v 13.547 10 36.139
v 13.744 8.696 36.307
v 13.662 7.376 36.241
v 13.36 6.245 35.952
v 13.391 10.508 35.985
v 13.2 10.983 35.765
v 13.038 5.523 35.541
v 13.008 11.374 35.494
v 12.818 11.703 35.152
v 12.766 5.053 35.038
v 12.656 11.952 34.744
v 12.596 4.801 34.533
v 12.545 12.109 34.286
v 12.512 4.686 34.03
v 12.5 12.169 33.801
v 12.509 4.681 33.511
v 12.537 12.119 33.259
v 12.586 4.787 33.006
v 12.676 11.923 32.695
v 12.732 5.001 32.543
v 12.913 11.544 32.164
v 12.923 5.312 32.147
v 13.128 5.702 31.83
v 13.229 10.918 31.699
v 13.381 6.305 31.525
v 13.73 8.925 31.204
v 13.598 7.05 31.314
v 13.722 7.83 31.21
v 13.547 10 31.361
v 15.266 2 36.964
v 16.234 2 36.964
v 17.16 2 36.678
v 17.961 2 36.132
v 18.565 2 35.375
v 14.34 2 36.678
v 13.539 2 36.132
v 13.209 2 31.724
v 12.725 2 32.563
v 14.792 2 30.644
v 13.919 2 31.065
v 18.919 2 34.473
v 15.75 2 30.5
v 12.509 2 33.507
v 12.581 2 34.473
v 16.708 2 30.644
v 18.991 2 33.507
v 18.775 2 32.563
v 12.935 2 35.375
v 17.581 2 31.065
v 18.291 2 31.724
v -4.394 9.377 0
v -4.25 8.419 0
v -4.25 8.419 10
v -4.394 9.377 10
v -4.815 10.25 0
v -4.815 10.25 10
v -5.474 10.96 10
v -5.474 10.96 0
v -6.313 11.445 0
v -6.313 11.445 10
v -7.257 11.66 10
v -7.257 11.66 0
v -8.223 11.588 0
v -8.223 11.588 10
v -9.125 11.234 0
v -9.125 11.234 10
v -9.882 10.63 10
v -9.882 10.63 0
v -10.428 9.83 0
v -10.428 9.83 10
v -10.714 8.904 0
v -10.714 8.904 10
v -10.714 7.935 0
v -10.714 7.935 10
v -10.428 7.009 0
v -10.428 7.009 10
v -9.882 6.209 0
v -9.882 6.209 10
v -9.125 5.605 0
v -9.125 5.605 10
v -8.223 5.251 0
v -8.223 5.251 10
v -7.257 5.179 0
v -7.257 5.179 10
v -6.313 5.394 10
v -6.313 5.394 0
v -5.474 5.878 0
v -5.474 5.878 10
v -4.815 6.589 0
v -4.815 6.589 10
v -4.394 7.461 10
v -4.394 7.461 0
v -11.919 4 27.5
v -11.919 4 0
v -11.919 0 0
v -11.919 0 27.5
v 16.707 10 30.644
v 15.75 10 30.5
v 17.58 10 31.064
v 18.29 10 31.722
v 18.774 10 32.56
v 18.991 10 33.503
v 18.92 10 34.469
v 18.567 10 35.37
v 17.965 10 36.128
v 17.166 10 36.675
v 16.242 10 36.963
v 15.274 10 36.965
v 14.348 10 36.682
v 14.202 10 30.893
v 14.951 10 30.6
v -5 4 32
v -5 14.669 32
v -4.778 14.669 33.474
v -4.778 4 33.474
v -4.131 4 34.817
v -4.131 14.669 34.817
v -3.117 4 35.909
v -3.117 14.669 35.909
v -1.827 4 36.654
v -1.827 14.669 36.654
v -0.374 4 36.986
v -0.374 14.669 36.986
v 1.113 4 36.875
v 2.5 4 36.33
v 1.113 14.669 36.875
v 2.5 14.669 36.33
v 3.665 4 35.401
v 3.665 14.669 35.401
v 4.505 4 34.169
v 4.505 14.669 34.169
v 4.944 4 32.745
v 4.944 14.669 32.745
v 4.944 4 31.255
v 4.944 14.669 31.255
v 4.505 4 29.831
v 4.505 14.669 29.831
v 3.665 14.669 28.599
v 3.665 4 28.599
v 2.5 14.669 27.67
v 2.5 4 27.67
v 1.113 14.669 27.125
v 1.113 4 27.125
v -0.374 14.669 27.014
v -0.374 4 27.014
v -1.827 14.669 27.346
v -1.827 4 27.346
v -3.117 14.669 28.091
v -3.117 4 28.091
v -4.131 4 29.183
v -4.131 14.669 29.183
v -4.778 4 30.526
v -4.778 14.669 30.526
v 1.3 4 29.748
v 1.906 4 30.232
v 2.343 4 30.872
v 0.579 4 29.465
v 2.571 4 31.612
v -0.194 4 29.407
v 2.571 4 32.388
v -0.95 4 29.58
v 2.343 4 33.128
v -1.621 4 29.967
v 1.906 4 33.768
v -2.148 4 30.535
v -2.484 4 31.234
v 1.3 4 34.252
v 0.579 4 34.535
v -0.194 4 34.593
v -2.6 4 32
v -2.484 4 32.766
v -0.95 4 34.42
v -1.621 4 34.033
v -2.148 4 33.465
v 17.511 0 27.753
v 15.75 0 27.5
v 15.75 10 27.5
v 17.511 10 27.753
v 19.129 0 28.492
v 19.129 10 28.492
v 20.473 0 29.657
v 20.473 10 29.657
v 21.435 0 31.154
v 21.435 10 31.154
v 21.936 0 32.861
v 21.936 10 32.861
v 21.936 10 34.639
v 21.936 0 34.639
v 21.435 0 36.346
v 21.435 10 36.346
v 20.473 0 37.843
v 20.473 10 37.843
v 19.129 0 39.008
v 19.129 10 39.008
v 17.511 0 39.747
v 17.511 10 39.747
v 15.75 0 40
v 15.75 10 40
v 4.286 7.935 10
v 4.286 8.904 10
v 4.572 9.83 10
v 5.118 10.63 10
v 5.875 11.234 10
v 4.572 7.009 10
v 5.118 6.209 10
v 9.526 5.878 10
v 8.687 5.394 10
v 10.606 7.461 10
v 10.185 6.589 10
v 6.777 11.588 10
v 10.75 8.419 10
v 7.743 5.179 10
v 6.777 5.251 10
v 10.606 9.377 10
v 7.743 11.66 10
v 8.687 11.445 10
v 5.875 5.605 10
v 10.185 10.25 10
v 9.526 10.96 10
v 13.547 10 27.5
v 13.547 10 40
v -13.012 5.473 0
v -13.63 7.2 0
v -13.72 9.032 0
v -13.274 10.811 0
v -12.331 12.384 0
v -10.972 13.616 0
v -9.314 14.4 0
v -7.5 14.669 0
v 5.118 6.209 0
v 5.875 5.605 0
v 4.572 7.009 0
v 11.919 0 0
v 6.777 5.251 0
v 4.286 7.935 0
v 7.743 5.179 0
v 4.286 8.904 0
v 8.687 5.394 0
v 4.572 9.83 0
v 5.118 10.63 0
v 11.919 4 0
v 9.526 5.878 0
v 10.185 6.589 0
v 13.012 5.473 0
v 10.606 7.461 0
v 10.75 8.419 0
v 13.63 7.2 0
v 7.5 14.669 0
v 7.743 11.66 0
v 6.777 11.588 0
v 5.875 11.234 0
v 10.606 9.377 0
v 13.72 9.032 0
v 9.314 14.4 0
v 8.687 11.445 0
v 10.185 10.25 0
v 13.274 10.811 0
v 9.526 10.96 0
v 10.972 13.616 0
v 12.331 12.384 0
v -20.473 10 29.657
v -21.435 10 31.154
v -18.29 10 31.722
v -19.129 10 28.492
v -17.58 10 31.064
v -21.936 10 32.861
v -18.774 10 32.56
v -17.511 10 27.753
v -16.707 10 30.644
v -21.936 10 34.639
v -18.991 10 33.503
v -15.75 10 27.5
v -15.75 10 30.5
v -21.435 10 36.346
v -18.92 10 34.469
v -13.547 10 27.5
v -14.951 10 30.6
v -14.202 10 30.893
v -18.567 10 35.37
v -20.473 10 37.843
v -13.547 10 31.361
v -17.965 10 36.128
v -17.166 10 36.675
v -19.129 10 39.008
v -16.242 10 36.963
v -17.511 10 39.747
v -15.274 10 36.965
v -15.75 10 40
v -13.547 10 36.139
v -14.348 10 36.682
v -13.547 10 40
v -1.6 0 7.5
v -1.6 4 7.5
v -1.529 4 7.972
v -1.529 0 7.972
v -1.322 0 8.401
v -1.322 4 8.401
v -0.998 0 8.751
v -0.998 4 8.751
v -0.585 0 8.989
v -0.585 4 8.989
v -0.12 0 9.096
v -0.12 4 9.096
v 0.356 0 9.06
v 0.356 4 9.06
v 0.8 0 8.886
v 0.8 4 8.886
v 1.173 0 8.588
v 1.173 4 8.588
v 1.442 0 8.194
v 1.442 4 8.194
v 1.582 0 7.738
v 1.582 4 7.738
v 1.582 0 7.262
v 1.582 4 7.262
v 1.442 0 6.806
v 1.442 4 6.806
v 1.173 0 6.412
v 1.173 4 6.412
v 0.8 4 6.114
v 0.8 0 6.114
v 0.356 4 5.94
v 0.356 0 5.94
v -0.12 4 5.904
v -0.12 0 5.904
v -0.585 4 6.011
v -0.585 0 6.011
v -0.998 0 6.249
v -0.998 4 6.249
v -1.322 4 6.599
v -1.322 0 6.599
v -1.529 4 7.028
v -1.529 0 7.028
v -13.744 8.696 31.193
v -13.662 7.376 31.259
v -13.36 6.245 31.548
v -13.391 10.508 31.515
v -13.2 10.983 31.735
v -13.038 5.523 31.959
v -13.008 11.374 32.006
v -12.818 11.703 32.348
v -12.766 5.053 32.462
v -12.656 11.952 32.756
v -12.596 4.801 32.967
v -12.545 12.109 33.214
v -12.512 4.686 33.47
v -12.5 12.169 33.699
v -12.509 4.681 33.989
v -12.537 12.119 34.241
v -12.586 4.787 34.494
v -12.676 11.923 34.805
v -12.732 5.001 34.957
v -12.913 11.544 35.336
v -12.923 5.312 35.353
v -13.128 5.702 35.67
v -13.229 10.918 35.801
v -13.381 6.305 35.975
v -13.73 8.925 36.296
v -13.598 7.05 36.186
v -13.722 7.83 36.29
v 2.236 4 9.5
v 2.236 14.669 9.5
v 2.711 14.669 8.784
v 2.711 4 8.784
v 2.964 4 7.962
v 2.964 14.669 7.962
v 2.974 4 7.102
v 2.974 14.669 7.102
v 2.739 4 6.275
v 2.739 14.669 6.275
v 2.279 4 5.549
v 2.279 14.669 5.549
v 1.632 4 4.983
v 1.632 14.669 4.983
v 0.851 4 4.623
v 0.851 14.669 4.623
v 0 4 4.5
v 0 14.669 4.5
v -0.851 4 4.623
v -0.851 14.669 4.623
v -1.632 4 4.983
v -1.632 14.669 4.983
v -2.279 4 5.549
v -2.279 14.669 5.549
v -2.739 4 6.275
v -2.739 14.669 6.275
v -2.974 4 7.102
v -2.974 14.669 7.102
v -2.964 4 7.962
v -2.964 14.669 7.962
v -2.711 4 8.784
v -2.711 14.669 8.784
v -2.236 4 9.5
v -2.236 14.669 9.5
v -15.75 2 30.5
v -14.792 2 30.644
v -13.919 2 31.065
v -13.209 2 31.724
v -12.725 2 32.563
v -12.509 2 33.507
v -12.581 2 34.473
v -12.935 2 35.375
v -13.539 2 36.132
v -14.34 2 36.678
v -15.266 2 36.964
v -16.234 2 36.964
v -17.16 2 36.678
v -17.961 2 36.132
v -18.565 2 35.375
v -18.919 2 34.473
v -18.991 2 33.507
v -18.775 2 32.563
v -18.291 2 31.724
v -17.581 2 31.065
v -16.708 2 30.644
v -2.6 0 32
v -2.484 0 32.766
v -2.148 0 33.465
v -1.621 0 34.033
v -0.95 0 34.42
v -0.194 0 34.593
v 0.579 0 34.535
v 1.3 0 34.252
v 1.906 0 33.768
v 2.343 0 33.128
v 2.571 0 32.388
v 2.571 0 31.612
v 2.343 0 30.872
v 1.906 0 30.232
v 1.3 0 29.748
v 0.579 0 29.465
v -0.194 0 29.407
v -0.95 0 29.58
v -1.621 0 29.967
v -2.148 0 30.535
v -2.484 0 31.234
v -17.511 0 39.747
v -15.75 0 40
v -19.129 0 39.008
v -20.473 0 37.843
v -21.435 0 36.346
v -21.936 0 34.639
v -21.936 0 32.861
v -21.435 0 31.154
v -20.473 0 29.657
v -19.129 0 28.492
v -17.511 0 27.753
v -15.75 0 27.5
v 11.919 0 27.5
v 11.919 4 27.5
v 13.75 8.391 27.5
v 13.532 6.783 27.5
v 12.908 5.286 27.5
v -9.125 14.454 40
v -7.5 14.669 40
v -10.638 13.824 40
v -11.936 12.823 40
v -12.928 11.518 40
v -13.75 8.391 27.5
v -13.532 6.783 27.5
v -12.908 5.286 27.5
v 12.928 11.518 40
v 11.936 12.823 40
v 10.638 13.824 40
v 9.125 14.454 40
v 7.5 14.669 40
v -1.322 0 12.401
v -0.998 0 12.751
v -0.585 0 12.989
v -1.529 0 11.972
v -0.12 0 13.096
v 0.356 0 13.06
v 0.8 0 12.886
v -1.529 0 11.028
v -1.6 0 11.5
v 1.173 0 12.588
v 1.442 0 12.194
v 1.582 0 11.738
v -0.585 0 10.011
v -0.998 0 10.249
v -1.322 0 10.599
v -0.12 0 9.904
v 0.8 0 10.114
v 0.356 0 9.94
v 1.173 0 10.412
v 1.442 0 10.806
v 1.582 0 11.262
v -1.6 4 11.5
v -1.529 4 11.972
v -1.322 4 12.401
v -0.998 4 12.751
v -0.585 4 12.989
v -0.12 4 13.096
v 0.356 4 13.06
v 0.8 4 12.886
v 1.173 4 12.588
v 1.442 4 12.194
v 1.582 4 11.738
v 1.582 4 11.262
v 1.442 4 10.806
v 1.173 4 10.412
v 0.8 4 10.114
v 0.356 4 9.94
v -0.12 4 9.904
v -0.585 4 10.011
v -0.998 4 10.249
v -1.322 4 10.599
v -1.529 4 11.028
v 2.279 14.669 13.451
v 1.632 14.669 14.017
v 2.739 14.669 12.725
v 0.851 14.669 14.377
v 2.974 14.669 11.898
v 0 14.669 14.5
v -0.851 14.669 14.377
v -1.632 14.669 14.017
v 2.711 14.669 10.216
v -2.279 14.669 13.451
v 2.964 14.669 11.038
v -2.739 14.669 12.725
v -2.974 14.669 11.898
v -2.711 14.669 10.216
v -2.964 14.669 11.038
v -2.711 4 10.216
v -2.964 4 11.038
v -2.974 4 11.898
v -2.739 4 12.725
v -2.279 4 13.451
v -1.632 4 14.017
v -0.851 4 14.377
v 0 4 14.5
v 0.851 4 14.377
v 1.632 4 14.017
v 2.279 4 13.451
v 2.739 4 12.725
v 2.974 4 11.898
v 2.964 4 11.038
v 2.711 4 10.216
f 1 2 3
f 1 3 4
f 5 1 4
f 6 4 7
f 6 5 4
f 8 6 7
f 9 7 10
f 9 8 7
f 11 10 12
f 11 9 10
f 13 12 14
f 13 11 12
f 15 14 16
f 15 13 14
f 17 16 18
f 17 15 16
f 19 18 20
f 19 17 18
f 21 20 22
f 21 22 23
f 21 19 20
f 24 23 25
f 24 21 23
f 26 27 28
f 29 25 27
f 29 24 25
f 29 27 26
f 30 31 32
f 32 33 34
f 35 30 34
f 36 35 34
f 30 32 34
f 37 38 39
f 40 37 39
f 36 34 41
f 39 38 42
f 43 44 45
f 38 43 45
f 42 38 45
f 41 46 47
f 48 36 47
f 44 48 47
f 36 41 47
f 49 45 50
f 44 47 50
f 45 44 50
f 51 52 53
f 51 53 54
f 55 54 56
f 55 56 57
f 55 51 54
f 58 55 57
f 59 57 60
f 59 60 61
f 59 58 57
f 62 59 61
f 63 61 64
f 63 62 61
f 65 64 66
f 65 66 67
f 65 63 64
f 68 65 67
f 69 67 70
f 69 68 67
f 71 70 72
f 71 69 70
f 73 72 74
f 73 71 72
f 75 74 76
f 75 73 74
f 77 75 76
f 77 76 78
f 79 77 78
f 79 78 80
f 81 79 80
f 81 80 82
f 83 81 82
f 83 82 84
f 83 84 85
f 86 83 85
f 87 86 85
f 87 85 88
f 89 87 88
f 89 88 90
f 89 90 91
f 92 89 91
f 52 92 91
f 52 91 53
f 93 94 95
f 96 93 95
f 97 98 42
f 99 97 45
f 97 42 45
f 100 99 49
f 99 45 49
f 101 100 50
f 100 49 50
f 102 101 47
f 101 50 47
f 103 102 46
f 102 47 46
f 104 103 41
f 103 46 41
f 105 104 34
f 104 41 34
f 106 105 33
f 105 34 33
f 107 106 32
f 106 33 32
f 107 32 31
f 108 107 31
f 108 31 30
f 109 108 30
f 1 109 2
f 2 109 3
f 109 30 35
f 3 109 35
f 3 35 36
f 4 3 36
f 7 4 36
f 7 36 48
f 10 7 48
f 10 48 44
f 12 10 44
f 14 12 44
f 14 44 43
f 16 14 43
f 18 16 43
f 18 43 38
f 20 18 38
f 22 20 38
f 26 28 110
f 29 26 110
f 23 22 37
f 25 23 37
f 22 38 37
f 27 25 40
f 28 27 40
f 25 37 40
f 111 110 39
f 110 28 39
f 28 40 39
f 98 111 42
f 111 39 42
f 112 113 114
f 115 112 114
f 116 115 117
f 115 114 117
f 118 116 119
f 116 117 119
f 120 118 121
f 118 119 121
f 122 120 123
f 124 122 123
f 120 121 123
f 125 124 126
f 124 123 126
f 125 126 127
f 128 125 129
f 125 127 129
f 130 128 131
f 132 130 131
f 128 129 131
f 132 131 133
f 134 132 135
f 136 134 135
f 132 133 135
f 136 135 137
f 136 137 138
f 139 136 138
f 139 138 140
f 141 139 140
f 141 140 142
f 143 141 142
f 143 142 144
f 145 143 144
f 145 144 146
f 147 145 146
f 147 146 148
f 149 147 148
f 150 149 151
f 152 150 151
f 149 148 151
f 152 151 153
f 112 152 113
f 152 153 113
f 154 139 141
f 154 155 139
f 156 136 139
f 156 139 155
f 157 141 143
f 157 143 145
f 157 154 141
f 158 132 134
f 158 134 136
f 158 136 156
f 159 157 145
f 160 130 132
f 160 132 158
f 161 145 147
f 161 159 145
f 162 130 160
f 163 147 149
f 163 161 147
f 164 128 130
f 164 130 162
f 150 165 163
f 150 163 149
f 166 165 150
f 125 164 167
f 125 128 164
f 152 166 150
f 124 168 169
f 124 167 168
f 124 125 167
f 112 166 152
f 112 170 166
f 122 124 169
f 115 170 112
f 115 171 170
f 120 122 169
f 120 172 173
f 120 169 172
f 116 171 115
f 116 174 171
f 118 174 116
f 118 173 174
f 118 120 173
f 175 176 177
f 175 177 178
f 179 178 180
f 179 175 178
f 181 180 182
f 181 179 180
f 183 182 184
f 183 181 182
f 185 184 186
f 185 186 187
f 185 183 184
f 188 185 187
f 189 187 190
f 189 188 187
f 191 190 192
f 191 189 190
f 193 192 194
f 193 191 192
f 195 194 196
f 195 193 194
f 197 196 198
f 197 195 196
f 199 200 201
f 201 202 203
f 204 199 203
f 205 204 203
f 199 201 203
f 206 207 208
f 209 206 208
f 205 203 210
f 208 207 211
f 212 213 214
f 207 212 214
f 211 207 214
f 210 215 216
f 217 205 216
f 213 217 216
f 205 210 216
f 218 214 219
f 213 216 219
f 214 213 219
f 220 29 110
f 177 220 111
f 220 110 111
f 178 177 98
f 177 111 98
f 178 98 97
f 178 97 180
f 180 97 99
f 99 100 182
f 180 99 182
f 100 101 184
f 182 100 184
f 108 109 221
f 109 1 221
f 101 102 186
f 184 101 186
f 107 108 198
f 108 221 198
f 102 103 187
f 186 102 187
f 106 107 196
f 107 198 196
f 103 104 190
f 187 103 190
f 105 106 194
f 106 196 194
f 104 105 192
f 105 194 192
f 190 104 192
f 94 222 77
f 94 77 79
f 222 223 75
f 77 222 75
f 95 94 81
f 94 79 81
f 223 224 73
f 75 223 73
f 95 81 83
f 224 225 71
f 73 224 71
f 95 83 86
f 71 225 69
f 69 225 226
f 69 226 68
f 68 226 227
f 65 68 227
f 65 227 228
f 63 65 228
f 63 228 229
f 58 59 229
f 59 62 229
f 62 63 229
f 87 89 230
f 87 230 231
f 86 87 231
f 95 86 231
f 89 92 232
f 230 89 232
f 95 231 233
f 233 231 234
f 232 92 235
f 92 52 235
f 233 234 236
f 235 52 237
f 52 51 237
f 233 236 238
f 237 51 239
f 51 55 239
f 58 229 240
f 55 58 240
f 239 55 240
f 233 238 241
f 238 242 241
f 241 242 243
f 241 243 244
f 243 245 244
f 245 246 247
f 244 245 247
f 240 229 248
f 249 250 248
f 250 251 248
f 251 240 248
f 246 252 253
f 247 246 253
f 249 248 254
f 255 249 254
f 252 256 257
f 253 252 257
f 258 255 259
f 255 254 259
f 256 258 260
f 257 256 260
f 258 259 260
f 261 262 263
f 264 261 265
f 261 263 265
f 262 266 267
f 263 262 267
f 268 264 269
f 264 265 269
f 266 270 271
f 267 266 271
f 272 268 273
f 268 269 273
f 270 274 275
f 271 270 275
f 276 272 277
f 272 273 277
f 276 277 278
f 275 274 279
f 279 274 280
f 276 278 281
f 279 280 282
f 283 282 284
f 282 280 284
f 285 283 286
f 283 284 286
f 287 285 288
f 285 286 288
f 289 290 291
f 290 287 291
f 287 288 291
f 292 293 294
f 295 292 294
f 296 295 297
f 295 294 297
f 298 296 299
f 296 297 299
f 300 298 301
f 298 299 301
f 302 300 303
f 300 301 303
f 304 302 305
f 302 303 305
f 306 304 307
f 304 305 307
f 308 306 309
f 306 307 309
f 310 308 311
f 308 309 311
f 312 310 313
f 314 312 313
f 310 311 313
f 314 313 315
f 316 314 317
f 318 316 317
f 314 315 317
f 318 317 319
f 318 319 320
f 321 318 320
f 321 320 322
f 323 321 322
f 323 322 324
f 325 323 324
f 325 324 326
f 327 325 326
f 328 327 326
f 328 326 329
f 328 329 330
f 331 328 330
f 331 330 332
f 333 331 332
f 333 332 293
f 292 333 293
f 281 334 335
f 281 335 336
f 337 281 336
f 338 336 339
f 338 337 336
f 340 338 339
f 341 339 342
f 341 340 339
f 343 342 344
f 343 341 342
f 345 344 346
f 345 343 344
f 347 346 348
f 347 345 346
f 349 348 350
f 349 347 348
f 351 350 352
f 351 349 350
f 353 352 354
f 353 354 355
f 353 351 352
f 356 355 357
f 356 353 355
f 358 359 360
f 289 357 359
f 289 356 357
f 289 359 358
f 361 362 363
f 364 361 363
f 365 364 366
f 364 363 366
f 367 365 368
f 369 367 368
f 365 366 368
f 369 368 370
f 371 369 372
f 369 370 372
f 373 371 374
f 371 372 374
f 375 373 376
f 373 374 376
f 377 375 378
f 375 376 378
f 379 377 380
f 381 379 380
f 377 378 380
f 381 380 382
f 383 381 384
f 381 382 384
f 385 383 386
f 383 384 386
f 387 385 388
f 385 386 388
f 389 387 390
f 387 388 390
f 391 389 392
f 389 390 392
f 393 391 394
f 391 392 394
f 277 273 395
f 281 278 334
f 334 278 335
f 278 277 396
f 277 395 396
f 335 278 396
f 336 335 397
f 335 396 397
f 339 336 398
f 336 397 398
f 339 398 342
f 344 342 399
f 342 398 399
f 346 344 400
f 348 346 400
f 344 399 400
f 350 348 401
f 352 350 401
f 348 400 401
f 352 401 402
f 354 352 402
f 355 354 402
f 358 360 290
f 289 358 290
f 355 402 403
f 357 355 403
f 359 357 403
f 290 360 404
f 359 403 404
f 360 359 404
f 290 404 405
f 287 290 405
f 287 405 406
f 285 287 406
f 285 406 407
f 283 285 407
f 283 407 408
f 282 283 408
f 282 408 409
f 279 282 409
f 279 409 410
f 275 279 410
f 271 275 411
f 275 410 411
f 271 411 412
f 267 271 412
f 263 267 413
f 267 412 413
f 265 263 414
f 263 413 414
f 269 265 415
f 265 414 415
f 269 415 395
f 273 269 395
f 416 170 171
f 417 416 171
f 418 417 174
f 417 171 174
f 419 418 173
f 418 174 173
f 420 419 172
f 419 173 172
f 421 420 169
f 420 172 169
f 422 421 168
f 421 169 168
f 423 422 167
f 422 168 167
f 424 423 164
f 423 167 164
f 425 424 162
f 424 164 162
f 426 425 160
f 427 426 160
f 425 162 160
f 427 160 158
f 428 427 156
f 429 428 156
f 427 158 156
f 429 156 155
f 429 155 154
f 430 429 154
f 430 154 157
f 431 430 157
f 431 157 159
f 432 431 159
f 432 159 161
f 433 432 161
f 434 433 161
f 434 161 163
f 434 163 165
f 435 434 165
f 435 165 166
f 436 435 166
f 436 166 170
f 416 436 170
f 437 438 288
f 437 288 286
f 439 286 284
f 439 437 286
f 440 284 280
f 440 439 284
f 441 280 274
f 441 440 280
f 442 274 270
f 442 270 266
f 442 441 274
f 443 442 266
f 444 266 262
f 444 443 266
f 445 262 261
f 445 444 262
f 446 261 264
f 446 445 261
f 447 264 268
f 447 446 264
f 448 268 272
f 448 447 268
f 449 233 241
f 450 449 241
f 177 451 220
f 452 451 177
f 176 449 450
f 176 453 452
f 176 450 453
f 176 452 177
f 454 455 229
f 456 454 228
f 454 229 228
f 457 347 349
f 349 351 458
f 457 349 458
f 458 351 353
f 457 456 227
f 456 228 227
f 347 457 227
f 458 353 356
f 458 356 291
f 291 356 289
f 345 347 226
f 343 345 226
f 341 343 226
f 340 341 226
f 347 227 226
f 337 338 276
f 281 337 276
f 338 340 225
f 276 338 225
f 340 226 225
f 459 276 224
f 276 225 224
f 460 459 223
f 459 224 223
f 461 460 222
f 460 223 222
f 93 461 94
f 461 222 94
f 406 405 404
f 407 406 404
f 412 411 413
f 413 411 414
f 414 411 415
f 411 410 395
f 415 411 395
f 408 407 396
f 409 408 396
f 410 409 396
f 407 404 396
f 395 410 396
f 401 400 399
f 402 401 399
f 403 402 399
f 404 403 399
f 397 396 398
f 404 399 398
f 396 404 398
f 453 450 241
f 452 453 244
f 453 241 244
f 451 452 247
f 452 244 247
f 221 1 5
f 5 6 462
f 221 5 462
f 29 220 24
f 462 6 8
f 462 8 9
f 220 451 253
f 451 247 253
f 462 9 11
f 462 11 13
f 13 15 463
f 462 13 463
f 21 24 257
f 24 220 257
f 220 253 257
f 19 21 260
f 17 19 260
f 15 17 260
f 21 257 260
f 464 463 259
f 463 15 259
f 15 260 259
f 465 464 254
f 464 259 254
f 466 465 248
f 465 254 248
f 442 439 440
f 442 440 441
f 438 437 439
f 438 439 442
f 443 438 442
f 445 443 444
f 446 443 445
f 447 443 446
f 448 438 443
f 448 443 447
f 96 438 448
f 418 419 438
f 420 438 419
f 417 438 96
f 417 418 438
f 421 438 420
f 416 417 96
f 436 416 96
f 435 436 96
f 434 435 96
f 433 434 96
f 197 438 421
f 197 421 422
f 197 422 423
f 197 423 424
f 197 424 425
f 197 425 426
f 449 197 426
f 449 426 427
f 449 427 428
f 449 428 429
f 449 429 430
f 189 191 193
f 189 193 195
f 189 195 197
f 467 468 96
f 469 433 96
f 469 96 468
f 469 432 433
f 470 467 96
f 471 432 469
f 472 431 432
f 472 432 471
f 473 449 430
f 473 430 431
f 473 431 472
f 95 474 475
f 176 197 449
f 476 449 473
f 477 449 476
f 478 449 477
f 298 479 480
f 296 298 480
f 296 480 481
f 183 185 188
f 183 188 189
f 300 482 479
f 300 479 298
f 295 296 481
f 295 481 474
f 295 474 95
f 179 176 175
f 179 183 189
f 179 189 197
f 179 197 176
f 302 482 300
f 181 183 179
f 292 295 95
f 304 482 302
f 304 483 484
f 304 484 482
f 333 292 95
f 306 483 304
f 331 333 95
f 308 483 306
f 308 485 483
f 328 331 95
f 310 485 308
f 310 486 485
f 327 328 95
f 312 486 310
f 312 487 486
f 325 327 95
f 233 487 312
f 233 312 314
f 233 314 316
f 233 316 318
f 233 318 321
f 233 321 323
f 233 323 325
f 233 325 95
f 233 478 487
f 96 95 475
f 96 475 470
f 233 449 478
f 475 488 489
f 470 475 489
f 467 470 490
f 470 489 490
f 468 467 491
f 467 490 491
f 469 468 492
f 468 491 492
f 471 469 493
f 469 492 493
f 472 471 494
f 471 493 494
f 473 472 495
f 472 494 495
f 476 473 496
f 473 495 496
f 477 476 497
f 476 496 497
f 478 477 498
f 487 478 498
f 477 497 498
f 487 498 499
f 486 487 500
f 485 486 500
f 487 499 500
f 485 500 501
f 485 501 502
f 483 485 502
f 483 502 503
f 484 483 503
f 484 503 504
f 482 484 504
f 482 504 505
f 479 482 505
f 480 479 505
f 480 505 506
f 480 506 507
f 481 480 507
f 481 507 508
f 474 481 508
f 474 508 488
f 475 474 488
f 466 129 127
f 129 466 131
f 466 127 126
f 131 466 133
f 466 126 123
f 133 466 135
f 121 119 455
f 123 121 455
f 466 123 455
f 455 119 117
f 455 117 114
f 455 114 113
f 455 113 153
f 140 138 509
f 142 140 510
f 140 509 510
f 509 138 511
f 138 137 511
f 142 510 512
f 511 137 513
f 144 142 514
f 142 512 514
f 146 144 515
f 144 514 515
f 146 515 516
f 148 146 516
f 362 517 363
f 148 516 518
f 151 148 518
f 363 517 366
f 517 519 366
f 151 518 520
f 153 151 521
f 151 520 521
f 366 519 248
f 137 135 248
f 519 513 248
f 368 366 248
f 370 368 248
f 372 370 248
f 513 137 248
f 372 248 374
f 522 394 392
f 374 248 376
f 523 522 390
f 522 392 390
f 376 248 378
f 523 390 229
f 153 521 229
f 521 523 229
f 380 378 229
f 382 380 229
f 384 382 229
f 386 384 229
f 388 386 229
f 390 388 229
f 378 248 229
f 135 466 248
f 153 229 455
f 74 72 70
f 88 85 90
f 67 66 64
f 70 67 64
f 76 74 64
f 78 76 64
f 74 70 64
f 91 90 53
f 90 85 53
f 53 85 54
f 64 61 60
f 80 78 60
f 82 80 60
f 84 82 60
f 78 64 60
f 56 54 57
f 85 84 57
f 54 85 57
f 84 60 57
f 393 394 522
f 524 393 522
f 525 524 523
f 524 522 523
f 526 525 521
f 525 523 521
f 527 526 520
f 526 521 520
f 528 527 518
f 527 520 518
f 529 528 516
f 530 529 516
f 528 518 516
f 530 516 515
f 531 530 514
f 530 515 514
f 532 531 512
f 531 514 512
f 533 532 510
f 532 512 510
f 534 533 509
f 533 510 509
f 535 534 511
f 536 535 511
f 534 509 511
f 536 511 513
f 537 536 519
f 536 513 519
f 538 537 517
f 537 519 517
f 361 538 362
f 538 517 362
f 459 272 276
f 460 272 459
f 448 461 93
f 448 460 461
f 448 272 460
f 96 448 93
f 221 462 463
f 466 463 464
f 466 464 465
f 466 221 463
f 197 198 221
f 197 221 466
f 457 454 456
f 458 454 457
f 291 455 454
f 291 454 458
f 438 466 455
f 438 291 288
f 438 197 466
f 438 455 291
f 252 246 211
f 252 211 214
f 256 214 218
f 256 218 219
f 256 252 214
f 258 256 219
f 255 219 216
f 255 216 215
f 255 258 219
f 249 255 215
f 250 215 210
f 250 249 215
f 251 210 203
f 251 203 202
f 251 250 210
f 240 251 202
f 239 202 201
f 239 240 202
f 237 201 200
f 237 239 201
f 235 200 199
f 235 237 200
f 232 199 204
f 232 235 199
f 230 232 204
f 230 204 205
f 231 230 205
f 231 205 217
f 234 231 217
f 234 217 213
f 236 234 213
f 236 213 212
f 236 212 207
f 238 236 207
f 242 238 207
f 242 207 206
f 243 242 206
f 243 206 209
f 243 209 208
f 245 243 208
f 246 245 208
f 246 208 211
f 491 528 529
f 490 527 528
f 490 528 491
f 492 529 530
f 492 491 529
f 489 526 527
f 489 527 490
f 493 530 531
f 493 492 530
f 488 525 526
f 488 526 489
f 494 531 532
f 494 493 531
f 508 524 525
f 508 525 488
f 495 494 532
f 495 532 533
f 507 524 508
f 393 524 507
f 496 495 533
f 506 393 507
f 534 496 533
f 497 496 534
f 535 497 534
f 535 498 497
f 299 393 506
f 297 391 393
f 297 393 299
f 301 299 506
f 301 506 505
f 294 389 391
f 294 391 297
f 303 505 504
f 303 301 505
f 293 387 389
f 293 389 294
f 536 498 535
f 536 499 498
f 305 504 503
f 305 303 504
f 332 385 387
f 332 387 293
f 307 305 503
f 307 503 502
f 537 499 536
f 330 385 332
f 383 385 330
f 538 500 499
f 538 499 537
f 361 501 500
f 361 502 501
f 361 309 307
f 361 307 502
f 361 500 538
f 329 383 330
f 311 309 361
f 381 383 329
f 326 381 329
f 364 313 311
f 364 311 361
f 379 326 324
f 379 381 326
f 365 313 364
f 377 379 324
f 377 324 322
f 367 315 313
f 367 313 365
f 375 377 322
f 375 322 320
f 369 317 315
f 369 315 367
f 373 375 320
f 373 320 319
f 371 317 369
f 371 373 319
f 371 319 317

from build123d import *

# Parameters (mm, degrees)
SKETCH1_R               = 3.25
BOSS_EXTRUDE1_DEPTH     = 40
BOSS_EXTRUDE2_START     = -30
SKETCH10_R              = 3.25
BOSS_EXTRUDE2_DEPTH     = 30
SKETCH2_R               = 3
SKETCH2_R_2             = 5
CUT_EXTRUDE1_DEPTH      = 10.669417382
SKETCH8_R               = 1.6
SKETCH8_R_2             = 2.6
CUT_EXTRUDE2_DEPTH      = 45.768898873
SKETCH11_R              = 3.25
BOSS_EXTRUDE3_DEPTH     = 10
CUT_EXTRUDE3_DEPTH      = 48.949888605
CUT_EXTRUDE3_DEPTH_BACK = 48.949888605
SKETCH12_R              = 3.25
SKETCH13_R              = 3.25
BOSS_EXTRUDE4_DEPTH     = 2


with BuildPart() as part:
    # Sketch1 → Boss-Extrude1 (new body)
    with BuildSketch(Plane.XY):
        with BuildLine():
            Line((-11.919417382, 0), (11.919417382, 0))
            Line((11.919417382, 0), (11.919417382, 4))
            ThreePointArc((11.919417382, 4), (13.274247078, 10.811188835), (7.5, 14.669417382))
            Line((7.5, 14.669417382), (-7.5, 14.669417382))
            ThreePointArc((-7.5, 14.669417382), (-13.274247078, 10.811188835), (-11.919417382, 4))
            Line((-11.919417382, 4), (-11.919417382, 0))
        make_face()
        with Locations((7.5, 8.419417382)):
            Circle(SKETCH1_R, mode=Mode.SUBTRACT)
        with Locations((-7.5, 8.419417382)):
            Circle(SKETCH1_R, mode=Mode.SUBTRACT)
    extrude(amount=BOSS_EXTRUDE1_DEPTH)

    # Sketch10 → Boss-Extrude2 (add)
    with BuildSketch(Plane.XY.offset(40).offset(BOSS_EXTRUDE2_START)):
        with Locations((7.5, 8.419417382)):
            Circle(SKETCH10_R)
        with Locations((-7.5, 8.419417382)):
            Circle(SKETCH10_R)
    extrude(amount=BOSS_EXTRUDE2_DEPTH)

    # Sketch2 → Cut-Extrude1 (cut)
    with BuildSketch(Plane(origin=(0, 14.669417382, 0), x_dir=(1, 0, 0), z_dir=(0, 1, 0))):
        with Locations((0, -7.5)):
            Circle(SKETCH2_R)
        with Locations((0, -11.5)):
            Circle(SKETCH2_R)
        with Locations(Location((0, -32, 0), (0, 0, 180))):
            Circle(SKETCH2_R_2)
    extrude(amount=-CUT_EXTRUDE1_DEPTH, mode=Mode.SUBTRACT)

    # Sketch8 → Cut-Extrude2 (cut, through all)
    with BuildSketch(Plane(origin=(0, 14.669417382, 0), x_dir=(1, 0, 0), z_dir=(0, 1, 0))):
        with Locations(Location((0, -7.5, 0), (0, 0, 180))):
            Circle(SKETCH8_R)
        with Locations(Location((0, -11.5, 0), (0, 0, 180))):
            Circle(SKETCH8_R)
        with Locations(Location((0, -32, 0), (0, 0, 180))):
            Circle(SKETCH8_R_2)
    extrude(amount=-CUT_EXTRUDE2_DEPTH, mode=Mode.SUBTRACT)

    # Sketch11 → Boss-Extrude3 (add)
    # profile 1 of 2: a face of its own
    with BuildSketch(Plane.XZ):
        with BuildLine():
            Line((-15.75, 27.5), (-11.919417382, 27.5))
            Line((-11.919417382, 27.5), (-11.919417382, 40))
            Line((-11.919417382, 40), (-15.75, 40))
            ThreePointArc((-15.75, 40), (-22, 33.75), (-15.75, 27.5))
        make_face()
        with Locations(Location((-15.75, 33.75, 0), (0, 0, 270))):
            Circle(SKETCH11_R, mode=Mode.SUBTRACT)
    # profile 2 of 2: a face of its own
    with BuildSketch(Plane.XZ):
        with BuildLine():
            Line((15.75, 40), (11.919417382, 40))
            Line((11.919417382, 40), (11.919417382, 27.5))
            Line((11.919417382, 27.5), (15.75, 27.5))
            ThreePointArc((15.75, 27.5), (22, 33.75), (15.75, 40))
        make_face()
        with Locations(Location((15.75, 33.75, 0), (0, 0, 270))):
            Circle(SKETCH11_R, mode=Mode.SUBTRACT)
    extrude(amount=-BOSS_EXTRUDE3_DEPTH)

    # Sketch12 → Cut-Extrude3 (cut, two sides: drawn at the far end of the back side and taken through both)
    with BuildSketch(Plane.XZ.offset(-CUT_EXTRUDE3_DEPTH_BACK)):
        with Locations(Location((15.75, 33.75, 0), (0, 0, 270))):
            Circle(SKETCH12_R)
        with Locations(Location((-15.75, 33.75, 0), (0, 0, 270))):
            Circle(SKETCH12_R)
    extrude(amount=CUT_EXTRUDE3_DEPTH + CUT_EXTRUDE3_DEPTH_BACK, mode=Mode.SUBTRACT)

    # Sketch13 → Boss-Extrude4 (add)
    with BuildSketch(Plane.XZ):
        with Locations(Location((15.75, 33.75, 0), (0, 0, 270))):
            Circle(SKETCH13_R)
        with Locations(Location((-15.75, 33.75, 0), (0, 0, 270))):
            Circle(SKETCH13_R)
    extrude(amount=-BOSS_EXTRUDE4_DEPTH)


solid = part.part
